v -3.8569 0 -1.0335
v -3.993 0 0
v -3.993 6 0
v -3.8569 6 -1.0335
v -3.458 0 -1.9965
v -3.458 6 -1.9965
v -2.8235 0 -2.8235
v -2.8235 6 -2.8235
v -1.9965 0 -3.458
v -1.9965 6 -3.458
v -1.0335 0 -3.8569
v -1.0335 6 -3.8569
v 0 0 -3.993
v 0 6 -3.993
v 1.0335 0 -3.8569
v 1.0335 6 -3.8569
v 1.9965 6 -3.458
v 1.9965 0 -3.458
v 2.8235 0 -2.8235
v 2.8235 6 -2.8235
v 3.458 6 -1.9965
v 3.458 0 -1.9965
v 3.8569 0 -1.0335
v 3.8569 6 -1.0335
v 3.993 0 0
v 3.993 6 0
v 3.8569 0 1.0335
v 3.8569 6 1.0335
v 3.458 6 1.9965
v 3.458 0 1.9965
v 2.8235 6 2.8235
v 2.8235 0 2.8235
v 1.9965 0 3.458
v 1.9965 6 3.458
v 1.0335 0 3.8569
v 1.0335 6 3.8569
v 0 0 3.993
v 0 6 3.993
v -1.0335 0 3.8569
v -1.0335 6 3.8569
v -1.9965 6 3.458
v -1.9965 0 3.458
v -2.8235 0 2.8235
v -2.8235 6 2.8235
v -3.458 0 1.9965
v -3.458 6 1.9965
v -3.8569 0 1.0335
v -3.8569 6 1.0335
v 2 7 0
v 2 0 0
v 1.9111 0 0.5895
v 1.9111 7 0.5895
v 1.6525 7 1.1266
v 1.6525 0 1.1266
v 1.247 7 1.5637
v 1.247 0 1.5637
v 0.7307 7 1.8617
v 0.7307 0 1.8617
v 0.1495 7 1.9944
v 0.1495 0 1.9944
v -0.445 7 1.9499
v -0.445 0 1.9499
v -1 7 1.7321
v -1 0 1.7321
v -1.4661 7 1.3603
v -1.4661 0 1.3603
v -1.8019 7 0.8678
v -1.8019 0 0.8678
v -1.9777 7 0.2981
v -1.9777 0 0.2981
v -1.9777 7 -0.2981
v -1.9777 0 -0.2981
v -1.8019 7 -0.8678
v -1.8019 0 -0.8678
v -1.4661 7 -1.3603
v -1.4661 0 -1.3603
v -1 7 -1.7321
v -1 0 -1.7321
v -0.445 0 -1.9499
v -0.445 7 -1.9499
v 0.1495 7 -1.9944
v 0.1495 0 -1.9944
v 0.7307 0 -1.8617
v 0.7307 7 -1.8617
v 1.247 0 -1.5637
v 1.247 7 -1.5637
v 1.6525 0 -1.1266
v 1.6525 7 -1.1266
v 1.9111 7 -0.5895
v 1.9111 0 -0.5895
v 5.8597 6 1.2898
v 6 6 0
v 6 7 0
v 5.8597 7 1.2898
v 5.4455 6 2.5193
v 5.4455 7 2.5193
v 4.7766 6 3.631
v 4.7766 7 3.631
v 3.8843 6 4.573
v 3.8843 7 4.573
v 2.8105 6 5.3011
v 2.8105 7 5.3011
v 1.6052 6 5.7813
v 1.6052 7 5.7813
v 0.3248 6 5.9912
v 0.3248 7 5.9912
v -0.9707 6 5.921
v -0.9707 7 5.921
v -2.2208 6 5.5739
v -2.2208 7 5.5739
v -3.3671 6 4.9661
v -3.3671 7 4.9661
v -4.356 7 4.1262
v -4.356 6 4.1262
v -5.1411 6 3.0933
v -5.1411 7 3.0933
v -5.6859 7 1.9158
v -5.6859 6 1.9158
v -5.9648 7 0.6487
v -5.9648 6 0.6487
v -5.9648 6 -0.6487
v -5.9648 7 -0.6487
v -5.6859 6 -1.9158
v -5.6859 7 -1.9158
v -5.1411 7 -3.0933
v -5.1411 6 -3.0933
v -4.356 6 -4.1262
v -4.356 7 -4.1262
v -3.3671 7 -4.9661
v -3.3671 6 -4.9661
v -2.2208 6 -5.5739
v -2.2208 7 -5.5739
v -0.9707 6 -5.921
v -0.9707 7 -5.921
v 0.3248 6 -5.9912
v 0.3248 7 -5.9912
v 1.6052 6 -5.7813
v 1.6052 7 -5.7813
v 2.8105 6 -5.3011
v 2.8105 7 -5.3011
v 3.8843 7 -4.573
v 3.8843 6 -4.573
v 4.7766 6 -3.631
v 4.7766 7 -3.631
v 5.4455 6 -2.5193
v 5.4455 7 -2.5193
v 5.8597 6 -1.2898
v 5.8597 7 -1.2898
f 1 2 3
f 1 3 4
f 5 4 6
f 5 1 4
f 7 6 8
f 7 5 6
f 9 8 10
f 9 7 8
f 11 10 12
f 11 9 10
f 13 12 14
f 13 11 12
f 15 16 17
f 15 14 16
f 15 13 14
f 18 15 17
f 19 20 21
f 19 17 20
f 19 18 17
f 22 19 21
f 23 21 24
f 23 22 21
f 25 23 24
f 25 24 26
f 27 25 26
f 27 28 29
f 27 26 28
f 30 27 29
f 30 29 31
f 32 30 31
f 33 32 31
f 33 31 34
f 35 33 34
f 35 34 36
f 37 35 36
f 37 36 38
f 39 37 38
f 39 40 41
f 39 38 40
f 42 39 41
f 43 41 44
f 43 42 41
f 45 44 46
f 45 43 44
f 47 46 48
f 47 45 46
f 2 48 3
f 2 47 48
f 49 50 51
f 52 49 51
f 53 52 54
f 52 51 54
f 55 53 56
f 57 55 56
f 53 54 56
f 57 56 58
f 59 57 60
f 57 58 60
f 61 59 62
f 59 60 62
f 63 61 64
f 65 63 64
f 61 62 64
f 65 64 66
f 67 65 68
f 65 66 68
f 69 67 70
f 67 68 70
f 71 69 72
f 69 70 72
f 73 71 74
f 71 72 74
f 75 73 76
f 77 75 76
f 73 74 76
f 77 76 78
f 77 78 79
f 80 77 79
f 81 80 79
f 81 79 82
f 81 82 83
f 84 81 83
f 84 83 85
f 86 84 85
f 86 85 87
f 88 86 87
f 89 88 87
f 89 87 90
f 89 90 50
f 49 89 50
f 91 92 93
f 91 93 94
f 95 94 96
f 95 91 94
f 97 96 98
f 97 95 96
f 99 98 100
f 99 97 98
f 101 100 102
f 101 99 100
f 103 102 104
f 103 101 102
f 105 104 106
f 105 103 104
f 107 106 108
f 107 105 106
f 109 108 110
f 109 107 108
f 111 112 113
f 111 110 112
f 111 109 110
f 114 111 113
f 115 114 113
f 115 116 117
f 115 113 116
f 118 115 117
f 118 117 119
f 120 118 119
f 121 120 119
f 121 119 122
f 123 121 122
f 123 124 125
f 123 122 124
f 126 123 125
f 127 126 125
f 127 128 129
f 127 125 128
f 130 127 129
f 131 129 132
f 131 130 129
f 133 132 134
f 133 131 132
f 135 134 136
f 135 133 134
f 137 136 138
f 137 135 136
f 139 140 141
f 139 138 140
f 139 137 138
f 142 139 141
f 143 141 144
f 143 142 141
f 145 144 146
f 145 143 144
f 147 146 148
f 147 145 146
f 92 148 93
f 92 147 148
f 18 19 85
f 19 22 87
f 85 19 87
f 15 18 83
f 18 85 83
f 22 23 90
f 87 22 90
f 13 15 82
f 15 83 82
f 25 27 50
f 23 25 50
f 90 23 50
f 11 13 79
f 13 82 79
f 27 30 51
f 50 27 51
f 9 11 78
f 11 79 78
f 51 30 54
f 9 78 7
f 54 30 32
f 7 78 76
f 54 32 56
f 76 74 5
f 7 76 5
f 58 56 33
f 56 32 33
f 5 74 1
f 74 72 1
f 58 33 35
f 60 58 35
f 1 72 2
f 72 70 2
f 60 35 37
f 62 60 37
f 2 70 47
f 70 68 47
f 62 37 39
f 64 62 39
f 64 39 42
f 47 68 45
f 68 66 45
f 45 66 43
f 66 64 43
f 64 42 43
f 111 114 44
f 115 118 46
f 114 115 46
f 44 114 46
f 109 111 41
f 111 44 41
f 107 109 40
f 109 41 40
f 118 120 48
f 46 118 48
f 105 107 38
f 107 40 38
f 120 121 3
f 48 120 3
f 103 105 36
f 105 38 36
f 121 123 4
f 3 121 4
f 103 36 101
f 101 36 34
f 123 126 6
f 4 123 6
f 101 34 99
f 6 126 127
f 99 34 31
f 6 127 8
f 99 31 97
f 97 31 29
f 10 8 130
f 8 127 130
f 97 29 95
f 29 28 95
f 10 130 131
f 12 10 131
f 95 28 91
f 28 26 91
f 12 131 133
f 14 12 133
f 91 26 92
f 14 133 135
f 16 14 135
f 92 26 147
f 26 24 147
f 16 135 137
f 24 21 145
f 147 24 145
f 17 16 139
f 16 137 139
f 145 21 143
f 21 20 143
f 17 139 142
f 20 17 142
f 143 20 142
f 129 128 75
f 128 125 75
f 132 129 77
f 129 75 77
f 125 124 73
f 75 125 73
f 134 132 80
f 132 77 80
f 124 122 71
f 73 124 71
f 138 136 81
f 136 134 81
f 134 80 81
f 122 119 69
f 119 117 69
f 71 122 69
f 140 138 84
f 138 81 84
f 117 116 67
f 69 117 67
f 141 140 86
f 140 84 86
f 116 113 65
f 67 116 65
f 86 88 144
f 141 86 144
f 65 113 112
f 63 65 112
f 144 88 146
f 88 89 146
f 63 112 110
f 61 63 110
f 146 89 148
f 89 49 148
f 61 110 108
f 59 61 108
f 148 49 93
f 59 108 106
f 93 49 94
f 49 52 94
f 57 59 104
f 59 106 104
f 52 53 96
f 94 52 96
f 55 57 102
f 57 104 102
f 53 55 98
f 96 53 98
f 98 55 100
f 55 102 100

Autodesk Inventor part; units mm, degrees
ref_plane "YZ Plane" through (0, 0, 0) normal (1, 0, 0) x (0, 1, 0)
ref_plane "XZ Plane" through (0, 0, 0) normal (0, 1, 0) x (-1, 0, 0)
ref_plane "XY Plane" through (0, 0, 0) normal (0, 0, 1) x (1, 0, 0)
sketch "Sketch1" plane through (0, 0, 0) normal (0, 1, 0) x (-1, 0, 0)
  circle A0 centre (0, 0) radius 3.993
  circle A1 centre (0, 0) radius 2.0625
  dimension "d0" = 7.986
  dimension "d1" = 4.125
extrude "Extrusion1" add sketch "Sketch1" along normal blind 6
sketch "Sketch2" plane through (0, 6, 0) normal (0, 1, 0) x (1, 0, 0)
  circle A0 centre (0, 0) radius 2.0625
  circle A1 centre (0, 0) radius 3.993
  circle A2 centre (0, 0) radius 6
  dimension "d4" = 12
extrude "Extrusion2" add sketch "Sketch2" along normal blind 1 contours A1 | A2
sketch "Sketch3" plane through (0, 0, 0) normal (0, -1, 0) x (1, 0, 0)
  circle A0 centre (0, 0) radius 2
  circle A1 centre (0, 0) radius 2.2361
  dimension "d7" = 4
extrude "Extrusion3" add sketch "Sketch3" against normal blind 7
properties part number "eje de rodaje"
